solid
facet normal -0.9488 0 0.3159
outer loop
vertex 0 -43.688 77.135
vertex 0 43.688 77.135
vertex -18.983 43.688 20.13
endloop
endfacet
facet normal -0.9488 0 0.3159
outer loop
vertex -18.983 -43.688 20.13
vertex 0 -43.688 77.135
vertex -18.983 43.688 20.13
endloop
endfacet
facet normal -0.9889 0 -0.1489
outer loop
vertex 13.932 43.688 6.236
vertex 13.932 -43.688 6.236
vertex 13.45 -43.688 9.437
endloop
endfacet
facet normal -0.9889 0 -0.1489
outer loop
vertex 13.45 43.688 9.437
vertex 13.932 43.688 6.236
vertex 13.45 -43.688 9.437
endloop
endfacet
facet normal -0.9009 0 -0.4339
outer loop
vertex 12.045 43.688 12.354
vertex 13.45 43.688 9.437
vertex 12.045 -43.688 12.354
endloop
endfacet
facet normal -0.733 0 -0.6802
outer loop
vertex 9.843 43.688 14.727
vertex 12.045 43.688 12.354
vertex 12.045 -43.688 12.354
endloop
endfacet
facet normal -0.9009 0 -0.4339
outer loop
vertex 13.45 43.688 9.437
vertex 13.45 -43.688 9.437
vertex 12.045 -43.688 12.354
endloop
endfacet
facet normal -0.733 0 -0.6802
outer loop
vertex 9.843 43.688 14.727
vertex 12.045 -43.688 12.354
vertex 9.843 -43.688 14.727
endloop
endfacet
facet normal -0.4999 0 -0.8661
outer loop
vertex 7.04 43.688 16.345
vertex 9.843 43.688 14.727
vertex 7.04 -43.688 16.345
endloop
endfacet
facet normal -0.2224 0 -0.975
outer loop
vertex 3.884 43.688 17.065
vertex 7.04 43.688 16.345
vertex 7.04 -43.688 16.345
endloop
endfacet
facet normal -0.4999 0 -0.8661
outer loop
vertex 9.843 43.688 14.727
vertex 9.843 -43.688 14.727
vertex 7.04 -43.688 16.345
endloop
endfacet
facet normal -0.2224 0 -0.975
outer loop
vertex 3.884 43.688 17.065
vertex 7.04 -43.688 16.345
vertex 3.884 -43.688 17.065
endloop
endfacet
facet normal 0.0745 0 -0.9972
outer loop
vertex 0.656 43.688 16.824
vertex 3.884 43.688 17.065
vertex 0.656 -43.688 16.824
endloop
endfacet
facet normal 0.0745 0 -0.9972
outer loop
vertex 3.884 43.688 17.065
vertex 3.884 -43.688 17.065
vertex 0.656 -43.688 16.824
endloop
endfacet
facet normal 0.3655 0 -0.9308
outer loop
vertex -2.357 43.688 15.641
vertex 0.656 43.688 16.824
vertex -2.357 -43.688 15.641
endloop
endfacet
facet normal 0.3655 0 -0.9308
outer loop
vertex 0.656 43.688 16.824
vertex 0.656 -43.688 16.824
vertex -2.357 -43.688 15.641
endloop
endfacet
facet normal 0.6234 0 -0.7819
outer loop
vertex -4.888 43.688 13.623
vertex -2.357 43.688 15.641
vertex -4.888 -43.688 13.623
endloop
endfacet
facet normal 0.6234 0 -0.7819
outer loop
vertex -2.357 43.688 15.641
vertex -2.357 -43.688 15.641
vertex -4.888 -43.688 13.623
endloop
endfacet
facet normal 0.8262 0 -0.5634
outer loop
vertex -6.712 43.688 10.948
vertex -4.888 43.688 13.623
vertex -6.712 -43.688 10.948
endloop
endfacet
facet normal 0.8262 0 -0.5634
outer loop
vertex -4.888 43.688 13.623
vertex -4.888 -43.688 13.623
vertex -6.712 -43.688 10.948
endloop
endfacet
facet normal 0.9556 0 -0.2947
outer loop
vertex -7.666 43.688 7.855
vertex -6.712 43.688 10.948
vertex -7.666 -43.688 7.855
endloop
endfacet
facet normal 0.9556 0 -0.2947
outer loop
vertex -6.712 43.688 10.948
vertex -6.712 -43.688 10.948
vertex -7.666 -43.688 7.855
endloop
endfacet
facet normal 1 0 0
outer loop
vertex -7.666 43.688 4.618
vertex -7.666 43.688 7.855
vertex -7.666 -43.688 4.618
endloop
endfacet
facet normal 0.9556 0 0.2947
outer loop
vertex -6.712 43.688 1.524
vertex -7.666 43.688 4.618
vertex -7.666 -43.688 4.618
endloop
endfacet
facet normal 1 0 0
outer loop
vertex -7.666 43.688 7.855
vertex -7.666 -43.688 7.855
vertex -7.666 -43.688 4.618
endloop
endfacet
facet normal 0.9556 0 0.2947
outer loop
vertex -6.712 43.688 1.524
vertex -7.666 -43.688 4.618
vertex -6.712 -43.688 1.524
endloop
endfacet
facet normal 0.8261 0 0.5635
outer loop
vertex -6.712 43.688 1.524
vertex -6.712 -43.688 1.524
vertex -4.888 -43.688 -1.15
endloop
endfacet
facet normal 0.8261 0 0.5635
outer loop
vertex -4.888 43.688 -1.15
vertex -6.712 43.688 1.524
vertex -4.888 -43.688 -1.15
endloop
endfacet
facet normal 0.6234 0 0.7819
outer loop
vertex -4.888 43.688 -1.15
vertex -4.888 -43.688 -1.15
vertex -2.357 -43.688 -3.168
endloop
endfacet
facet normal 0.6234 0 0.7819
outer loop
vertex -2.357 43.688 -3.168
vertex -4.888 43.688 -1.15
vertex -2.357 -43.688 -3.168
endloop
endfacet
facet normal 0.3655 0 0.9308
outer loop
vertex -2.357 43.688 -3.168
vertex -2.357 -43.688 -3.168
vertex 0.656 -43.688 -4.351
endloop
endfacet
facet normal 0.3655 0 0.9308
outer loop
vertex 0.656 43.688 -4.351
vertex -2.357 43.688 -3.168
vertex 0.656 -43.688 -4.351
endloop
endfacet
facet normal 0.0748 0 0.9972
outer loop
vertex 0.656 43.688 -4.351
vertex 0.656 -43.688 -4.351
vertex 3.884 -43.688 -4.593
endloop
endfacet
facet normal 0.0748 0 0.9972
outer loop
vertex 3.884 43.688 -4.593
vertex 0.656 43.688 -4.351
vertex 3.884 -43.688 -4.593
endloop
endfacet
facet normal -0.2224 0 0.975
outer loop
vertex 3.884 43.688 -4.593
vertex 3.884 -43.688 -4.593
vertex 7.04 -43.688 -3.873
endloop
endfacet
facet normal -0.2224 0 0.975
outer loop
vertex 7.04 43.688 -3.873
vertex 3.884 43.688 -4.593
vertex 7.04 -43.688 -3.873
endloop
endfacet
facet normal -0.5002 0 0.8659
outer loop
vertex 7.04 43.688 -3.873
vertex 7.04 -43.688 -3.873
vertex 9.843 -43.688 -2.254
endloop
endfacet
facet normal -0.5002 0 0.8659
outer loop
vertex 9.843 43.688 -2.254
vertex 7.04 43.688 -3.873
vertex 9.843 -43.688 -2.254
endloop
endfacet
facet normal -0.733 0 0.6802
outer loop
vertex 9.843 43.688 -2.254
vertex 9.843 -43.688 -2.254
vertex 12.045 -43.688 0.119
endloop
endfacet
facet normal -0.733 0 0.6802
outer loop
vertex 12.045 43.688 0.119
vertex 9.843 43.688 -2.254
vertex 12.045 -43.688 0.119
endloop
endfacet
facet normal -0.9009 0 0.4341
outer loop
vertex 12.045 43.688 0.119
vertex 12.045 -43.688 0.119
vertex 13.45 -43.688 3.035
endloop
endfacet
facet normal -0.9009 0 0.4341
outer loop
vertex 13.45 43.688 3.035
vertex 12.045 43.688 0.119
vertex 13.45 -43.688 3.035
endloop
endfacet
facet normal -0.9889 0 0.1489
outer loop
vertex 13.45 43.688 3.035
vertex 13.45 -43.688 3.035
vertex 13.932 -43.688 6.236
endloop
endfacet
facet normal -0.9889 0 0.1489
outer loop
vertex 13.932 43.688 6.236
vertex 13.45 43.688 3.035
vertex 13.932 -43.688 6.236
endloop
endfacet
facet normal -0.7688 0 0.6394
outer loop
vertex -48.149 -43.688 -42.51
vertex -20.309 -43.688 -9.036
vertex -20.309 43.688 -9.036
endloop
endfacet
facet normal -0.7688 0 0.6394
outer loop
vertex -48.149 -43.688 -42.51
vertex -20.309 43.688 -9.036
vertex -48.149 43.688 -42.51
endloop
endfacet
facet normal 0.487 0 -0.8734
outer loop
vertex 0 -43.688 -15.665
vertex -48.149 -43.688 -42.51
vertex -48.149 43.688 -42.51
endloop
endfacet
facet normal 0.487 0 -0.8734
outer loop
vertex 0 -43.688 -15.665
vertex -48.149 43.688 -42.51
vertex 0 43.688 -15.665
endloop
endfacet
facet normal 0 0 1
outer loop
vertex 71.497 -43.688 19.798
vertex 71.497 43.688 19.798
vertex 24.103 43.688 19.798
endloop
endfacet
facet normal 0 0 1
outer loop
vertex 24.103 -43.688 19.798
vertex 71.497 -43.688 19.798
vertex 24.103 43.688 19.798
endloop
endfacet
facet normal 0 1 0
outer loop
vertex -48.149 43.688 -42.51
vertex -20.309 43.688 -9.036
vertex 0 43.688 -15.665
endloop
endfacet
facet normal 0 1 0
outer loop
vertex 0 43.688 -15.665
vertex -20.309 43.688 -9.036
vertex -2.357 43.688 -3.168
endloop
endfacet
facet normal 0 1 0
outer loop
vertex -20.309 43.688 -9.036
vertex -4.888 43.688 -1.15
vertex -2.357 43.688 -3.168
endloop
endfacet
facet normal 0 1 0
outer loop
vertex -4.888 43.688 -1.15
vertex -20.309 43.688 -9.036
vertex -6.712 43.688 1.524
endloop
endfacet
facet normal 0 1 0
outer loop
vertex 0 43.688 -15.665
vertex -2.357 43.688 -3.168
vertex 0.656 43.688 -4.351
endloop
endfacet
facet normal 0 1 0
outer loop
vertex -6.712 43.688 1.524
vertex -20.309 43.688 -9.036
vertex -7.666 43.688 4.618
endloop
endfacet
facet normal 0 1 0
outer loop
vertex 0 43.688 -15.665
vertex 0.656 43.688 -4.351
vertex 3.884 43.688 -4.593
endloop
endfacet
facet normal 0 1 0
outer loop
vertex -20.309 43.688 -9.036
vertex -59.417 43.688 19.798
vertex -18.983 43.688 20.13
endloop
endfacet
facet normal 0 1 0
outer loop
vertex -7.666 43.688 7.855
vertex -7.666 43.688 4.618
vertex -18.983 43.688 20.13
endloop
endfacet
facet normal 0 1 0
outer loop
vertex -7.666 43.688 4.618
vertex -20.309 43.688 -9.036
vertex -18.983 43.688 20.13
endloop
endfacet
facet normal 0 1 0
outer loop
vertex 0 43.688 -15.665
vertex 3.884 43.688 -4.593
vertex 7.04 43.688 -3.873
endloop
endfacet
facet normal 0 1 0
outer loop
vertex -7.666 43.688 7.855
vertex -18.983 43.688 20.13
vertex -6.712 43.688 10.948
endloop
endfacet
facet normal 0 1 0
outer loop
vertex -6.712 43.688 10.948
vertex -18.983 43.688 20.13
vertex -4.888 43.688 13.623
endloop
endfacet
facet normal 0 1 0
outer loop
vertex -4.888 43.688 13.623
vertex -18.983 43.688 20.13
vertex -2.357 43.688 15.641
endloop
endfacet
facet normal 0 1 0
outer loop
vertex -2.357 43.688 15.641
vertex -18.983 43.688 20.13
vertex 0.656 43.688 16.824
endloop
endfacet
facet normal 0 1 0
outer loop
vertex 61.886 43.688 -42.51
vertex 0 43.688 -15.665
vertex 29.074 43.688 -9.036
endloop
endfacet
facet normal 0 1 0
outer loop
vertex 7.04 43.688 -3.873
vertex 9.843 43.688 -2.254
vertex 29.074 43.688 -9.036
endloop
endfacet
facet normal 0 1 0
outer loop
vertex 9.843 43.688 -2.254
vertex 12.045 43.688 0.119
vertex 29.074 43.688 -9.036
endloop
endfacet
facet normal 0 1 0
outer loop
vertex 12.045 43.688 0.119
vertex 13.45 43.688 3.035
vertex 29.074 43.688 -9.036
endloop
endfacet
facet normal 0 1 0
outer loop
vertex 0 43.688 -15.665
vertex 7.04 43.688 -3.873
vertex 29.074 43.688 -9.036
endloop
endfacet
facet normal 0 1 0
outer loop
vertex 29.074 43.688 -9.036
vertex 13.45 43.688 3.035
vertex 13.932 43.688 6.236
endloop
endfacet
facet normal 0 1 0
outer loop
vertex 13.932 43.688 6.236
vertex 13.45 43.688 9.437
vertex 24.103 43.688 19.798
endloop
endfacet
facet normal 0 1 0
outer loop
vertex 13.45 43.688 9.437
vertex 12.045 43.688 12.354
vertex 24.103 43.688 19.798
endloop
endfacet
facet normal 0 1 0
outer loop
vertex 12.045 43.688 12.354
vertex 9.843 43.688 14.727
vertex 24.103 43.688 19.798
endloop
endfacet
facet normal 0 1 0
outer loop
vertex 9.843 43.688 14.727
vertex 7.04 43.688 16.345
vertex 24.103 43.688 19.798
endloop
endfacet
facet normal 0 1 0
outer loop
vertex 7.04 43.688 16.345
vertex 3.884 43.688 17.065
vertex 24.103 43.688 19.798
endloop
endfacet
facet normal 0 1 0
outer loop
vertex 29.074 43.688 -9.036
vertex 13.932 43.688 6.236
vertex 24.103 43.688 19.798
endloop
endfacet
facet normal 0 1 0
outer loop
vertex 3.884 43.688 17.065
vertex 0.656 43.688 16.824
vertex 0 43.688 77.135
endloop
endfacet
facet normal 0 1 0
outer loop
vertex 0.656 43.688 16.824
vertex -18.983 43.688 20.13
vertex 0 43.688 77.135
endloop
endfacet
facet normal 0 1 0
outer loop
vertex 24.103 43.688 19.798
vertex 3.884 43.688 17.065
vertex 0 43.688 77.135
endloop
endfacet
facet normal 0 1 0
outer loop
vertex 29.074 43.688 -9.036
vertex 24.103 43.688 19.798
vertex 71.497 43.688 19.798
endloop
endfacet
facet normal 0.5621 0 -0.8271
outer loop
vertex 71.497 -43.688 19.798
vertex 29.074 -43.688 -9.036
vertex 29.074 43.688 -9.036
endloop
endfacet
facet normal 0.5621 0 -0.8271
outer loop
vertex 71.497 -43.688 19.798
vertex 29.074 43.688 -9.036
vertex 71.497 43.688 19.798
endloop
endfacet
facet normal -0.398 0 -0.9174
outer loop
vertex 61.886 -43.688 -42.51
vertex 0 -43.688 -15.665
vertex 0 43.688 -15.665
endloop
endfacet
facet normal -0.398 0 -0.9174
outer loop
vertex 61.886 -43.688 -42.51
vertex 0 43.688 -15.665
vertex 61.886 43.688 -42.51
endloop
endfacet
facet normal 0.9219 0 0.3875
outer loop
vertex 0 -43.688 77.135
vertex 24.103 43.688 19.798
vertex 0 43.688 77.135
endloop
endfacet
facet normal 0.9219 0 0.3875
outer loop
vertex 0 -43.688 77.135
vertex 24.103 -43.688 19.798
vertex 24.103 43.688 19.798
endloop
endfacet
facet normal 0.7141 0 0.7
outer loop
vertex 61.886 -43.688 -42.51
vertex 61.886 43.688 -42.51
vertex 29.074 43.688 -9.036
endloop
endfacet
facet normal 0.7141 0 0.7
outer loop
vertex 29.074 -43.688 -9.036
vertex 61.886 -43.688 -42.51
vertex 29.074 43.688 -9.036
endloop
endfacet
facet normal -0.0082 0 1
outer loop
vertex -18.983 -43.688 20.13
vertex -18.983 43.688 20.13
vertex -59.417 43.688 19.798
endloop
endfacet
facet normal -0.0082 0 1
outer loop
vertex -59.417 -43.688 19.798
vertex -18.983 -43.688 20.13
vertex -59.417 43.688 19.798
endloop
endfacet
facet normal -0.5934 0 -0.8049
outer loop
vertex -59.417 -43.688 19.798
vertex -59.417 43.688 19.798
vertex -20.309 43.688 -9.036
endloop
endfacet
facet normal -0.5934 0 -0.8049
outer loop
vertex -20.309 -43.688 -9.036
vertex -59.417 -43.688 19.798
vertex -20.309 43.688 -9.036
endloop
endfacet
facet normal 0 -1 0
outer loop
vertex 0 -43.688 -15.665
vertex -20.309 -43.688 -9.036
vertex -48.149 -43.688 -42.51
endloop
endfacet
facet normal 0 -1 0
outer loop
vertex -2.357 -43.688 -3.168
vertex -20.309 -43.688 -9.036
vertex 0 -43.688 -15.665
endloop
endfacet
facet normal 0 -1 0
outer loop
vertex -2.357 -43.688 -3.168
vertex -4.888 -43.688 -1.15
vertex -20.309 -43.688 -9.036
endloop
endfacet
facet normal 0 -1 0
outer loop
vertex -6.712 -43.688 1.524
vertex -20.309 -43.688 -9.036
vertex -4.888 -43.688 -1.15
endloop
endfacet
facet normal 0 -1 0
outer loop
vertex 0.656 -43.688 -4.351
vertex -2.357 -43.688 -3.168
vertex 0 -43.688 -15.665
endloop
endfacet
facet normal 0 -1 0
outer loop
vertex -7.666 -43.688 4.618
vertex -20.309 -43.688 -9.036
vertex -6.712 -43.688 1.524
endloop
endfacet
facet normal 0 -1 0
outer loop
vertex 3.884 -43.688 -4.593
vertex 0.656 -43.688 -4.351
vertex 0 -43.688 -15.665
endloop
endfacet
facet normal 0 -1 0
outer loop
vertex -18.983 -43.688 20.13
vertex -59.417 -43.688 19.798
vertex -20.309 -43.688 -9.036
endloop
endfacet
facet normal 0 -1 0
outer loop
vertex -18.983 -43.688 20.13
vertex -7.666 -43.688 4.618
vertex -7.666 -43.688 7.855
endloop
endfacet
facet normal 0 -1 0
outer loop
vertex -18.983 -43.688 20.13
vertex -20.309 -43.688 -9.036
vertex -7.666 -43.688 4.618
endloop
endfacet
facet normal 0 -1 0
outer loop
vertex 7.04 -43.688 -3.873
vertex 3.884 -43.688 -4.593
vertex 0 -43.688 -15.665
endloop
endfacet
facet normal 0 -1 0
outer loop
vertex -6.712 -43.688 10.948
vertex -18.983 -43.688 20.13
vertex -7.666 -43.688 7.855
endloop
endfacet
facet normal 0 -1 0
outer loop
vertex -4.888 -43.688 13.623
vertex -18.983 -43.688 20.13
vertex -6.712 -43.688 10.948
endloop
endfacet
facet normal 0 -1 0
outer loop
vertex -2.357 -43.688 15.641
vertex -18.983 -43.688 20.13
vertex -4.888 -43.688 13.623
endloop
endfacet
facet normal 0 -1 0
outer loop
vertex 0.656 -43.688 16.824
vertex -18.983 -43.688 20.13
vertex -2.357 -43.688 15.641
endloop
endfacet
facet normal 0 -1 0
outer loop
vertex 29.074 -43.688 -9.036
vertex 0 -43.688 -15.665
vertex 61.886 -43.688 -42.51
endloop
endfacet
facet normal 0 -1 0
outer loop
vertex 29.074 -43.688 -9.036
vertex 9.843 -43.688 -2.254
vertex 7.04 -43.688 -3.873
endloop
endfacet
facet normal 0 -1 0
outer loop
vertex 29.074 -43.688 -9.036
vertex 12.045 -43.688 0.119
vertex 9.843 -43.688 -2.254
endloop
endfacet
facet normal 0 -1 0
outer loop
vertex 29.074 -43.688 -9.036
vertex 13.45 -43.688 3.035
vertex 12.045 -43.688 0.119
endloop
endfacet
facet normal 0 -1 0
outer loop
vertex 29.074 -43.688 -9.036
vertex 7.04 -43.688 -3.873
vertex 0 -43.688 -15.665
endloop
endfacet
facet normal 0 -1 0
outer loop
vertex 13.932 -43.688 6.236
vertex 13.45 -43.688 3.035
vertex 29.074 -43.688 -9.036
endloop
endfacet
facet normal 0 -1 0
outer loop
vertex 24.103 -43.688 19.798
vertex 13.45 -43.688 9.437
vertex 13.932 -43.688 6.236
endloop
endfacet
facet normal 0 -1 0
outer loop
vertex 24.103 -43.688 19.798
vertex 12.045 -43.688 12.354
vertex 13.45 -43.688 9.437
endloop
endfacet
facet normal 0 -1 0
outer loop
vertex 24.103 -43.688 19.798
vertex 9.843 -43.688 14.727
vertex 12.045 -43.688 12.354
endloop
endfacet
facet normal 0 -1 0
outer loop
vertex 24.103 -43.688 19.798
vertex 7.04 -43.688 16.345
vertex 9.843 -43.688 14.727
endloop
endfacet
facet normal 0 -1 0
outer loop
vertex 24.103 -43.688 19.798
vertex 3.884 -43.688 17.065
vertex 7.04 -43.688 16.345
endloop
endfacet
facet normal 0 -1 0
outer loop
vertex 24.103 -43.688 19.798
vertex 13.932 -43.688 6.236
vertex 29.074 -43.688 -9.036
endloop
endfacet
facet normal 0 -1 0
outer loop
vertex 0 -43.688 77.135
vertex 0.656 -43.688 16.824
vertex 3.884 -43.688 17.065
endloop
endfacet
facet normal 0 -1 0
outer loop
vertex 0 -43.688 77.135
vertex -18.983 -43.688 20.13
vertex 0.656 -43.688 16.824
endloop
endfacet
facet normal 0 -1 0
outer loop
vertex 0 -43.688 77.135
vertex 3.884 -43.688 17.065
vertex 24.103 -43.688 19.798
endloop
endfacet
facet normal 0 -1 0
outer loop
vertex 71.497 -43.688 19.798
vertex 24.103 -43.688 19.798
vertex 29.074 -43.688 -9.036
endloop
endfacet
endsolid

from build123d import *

# Parameters (mm, degrees)
F1_DEPTH = 43.688
F2_R     = 10.859557
F3_DEPTH = 87.377


with BuildPart() as f1:
    # F0 (on Front) → F1 (new body, symmetric)
    with BuildSketch(Plane.XZ):
        Polygon((0, 77.135481), (-18.982824, 20.129664), (-59.417184, 19.798236), (-20.308541, -9.036103), (-48.148591, -42.51045), (0, -15.664687), (61.885897, -42.51045), (29.074408, -9.036103), (71.497343, 19.798236), (24.102971, 19.798236), align=None)
    extrude(amount=F1_DEPTH, both=True)

    # F2 (on face) → F3 (cut, through all)
    with BuildSketch(Plane.XZ.offset(43.688)):
        with Locations((3.072421, 6.236229)):
            Circle(F2_R)
    extrude(amount=-F3_DEPTH, mode=Mode.SUBTRACT)


solid = f1.part
